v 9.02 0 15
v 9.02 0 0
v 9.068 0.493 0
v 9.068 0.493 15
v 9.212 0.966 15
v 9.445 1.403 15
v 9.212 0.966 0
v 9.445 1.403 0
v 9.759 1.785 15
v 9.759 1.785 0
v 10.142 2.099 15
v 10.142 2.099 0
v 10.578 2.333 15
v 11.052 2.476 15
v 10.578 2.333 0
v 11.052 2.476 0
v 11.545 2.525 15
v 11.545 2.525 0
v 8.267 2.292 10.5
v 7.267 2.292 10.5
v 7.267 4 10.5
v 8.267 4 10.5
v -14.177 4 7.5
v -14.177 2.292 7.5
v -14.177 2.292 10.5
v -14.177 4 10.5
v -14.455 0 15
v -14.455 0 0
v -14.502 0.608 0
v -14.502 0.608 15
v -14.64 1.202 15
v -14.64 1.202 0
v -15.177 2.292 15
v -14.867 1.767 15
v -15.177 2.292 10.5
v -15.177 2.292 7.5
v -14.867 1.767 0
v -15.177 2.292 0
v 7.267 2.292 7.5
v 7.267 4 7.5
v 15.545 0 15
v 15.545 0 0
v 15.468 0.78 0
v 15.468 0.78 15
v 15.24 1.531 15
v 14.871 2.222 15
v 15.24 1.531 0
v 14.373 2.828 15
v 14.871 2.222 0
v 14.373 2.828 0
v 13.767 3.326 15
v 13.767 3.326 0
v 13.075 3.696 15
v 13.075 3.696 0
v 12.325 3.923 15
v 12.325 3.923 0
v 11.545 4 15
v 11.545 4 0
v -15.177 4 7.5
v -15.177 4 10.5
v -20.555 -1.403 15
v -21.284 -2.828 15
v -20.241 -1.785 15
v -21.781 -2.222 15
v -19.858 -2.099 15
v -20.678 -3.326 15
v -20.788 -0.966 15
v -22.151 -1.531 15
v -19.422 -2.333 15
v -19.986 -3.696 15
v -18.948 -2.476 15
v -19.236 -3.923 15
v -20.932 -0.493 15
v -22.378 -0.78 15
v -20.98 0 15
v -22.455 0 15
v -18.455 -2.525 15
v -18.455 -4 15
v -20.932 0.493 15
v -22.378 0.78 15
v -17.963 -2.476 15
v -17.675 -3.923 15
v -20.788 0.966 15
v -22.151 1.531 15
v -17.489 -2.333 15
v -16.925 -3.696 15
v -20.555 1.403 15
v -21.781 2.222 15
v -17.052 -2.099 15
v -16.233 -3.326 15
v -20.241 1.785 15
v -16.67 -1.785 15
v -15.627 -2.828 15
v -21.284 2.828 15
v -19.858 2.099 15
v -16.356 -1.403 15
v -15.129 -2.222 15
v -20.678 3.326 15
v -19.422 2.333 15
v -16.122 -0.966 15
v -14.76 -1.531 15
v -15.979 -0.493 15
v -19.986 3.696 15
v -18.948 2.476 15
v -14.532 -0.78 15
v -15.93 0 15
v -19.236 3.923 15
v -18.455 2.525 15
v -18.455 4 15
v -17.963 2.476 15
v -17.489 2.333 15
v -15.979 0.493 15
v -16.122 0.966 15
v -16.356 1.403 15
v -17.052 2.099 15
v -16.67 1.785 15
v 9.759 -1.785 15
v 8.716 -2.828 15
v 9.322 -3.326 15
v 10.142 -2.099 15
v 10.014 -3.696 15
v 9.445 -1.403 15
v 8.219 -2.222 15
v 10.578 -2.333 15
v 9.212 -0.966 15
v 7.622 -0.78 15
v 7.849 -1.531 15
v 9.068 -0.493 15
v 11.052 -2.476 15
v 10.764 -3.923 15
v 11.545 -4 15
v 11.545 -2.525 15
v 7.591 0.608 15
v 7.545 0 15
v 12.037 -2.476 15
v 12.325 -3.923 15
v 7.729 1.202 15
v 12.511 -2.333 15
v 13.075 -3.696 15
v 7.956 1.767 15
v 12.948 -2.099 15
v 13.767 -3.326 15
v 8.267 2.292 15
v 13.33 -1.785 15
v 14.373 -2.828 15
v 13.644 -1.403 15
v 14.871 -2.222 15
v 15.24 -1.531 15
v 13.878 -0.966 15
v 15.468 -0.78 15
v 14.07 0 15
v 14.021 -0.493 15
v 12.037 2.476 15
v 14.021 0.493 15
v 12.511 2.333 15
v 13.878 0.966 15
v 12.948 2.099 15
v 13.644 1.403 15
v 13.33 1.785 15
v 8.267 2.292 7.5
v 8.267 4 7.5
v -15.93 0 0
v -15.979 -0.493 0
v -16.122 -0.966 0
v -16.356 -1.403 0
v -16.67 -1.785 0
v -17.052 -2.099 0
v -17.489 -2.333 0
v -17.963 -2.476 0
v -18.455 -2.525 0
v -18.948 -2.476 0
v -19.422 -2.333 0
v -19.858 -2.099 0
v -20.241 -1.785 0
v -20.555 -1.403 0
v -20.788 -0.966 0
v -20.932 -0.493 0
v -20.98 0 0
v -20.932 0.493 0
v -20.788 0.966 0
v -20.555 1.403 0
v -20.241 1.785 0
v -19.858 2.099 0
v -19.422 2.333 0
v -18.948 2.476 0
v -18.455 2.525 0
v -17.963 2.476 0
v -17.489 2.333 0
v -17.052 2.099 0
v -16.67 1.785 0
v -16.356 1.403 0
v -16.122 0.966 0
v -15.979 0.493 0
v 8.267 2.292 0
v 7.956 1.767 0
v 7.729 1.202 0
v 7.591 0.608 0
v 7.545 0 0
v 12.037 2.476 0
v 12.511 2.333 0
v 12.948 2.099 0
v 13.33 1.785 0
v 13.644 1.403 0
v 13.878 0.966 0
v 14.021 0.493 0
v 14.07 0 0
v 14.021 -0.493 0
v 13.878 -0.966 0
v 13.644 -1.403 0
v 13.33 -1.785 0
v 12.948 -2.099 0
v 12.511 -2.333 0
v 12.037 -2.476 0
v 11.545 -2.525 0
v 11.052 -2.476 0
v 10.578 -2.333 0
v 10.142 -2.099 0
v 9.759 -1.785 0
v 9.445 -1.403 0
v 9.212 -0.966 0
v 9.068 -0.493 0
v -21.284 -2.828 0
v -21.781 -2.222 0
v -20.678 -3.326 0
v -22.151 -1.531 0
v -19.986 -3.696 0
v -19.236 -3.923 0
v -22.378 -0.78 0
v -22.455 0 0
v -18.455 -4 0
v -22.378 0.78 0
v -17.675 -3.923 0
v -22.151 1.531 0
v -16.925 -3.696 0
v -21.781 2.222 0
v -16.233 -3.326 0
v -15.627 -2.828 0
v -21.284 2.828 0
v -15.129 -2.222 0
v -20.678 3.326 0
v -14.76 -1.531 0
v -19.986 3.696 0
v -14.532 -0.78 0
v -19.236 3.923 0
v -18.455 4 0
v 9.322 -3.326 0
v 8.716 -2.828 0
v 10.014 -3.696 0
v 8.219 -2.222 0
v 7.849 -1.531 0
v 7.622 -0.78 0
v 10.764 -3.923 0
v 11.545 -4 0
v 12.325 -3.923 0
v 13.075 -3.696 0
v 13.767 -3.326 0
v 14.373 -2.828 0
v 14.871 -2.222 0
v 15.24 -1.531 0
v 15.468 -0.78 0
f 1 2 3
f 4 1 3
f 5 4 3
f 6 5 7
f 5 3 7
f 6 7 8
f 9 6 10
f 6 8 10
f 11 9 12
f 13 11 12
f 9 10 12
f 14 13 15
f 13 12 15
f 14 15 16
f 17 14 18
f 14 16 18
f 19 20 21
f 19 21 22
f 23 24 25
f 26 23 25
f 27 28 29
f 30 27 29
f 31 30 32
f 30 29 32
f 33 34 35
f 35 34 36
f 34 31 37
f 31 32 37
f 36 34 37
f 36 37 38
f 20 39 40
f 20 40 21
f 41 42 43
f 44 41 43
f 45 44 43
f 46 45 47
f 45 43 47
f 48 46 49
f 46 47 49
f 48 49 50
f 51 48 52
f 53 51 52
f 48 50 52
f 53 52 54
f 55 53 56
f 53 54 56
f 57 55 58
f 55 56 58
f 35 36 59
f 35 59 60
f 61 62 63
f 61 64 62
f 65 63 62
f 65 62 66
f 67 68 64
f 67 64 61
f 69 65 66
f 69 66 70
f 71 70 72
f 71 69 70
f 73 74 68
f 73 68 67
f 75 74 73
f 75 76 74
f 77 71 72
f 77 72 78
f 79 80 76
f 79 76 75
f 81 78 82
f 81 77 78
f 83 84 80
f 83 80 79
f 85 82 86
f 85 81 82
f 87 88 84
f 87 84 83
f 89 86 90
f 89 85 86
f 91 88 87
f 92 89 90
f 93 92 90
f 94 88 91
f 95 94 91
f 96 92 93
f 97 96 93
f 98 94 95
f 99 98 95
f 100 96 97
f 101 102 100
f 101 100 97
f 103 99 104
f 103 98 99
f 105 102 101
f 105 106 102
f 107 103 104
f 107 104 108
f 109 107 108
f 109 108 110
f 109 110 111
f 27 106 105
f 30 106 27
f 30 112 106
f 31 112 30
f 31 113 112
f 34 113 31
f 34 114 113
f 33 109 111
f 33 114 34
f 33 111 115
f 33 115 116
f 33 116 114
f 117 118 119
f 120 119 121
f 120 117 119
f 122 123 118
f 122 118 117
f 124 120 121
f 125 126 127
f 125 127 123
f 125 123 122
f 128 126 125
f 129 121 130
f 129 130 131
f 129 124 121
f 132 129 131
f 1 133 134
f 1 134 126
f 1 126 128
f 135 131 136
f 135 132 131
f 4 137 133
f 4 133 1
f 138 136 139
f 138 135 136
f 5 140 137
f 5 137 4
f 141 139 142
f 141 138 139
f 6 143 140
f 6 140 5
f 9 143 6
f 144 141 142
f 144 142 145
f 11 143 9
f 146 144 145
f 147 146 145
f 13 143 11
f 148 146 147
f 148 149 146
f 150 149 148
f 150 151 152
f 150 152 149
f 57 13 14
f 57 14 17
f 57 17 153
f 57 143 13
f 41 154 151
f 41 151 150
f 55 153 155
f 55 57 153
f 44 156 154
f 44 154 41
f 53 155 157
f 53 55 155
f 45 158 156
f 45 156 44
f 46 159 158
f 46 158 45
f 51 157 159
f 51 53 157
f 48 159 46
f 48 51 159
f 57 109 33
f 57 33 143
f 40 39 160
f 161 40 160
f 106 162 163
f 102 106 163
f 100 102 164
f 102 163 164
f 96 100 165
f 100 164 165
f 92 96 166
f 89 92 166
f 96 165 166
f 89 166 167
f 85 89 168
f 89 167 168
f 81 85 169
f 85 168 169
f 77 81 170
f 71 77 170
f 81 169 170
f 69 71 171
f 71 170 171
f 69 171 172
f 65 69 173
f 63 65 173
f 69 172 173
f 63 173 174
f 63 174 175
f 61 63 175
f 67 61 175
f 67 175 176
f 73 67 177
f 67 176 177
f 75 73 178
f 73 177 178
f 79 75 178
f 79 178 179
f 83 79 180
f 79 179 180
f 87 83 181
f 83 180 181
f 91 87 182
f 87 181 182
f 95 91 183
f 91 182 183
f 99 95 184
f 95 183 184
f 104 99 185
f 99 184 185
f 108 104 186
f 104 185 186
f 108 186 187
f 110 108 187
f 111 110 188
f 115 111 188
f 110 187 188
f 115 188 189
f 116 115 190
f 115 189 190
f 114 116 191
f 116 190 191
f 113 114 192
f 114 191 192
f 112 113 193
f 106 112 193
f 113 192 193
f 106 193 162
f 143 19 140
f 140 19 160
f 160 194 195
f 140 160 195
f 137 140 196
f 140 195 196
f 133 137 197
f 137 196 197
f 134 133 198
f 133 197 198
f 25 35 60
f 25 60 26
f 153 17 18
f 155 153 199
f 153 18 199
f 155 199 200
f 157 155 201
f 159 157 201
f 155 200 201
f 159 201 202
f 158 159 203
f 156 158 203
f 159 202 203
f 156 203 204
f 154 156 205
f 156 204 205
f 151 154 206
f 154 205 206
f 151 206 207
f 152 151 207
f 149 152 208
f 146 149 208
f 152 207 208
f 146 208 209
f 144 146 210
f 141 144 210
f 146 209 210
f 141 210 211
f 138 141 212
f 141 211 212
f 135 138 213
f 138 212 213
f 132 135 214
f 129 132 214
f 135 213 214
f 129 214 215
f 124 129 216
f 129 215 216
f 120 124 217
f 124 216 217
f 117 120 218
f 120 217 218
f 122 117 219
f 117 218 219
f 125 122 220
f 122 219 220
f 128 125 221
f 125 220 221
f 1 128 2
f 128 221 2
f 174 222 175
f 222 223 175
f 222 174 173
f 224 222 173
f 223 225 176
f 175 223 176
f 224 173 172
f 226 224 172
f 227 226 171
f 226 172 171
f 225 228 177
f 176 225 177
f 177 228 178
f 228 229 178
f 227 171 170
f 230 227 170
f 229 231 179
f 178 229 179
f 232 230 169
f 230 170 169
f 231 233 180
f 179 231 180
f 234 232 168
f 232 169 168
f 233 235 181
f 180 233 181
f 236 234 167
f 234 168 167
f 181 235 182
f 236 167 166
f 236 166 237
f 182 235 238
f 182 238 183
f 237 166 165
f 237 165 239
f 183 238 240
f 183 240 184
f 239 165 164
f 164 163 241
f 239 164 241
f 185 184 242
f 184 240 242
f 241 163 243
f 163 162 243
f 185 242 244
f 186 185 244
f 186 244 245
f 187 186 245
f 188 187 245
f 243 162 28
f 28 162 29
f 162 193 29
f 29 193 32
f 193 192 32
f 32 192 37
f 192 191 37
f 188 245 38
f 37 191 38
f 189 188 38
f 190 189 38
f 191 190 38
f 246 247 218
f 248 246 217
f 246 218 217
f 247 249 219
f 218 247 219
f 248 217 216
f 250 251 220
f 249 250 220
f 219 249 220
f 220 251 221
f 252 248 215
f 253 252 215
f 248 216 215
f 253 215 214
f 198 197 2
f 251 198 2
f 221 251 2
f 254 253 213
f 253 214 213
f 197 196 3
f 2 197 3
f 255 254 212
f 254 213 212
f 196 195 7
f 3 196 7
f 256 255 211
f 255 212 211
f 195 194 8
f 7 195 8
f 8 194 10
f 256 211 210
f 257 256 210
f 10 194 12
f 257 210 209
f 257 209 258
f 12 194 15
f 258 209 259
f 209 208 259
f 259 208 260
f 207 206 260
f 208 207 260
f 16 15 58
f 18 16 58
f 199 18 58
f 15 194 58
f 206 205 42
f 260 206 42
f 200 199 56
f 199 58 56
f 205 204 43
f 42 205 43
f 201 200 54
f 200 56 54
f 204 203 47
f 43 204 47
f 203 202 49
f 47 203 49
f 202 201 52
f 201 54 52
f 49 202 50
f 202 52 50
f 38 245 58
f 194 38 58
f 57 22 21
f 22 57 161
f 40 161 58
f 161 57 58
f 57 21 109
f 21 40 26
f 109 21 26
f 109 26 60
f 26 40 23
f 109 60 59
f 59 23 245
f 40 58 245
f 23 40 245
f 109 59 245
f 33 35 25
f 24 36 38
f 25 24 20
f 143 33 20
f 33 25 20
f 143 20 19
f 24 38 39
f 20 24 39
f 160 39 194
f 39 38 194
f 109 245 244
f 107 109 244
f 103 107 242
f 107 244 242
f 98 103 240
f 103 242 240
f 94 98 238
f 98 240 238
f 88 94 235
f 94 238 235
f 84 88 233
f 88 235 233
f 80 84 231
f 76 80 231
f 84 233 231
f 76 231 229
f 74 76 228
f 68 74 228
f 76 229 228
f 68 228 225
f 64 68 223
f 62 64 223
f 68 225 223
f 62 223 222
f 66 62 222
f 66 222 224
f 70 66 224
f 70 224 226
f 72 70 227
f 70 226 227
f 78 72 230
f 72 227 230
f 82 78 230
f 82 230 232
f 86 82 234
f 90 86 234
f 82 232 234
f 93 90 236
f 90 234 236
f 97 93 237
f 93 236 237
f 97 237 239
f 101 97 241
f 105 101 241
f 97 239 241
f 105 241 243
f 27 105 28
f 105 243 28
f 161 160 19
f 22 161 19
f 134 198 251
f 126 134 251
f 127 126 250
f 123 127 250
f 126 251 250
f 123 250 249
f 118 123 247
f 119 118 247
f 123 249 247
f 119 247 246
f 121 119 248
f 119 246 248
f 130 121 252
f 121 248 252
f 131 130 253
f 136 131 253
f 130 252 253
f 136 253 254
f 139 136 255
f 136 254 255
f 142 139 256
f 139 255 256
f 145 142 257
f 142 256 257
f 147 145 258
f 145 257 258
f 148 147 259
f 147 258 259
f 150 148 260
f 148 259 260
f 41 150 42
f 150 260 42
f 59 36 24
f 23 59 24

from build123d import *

# Parameters (mm, degrees)
F1_DEPTH = 15
F2_W     = 1
F2_H     = 3
F3_DEPTH = 25


with BuildPart() as f1:
    # F0 (on Top) → F1 (new body)
    with BuildSketch(Plane.XY):
        with BuildLine():
            ThreePointArc((-18.455241, 2.525), (-16.669796, 1.785445), (-15.930241, 0))
            Line((-15.930241, 0), (-14.455241, 0))
            ThreePointArc((-14.455241, 0), (-14.639965, 1.201527), (-15.177075, 2.292079))
            ThreePointArc((-15.177075, 2.292079), (-16.607041, 3.547416), (-18.455241, 4))
            Line((-18.455241, 4), (-18.455241, 2.525))
        make_face()
        with BuildLine():
            Line((11.544759, 2.525), (11.544759, 4))
            ThreePointArc((11.544759, 4), (9.69656, 3.547416), (8.266593, 2.292079))
            ThreePointArc((8.266593, 2.292079), (7.729483, 1.201527), (7.544759, 0))
            Line((7.544759, 0), (9.019759, 0))
            ThreePointArc((9.019759, 0), (9.759315, 1.785445), (11.544759, 2.525))
        make_face()
        with BuildLine():
            Line((-14.455241, 0), (-15.930241, 0))
            ThreePointArc((-15.930241, 0), (-20.240685, -1.785445), (-18.455241, 2.525))
            Line((-18.455241, 2.525), (-18.455241, 4))
            ThreePointArc((-18.455241, 4), (-21.283668, -2.828427), (-14.455241, 0))
        make_face()
        with BuildLine():
            ThreePointArc((15.544759, 0), (14.373186, 2.828427), (11.544759, 4))
            Line((11.544759, 4), (11.544759, 2.525))
            ThreePointArc((11.544759, 2.525), (13.330204, 1.785445), (14.069759, 0))
            ThreePointArc((14.069759, 0), (11.544759, -2.525), (9.019759, 0))
            Line((9.019759, 0), (7.544759, 0))
            ThreePointArc((7.544759, 0), (11.544759, -4), (15.544759, 0))
        make_face()
        with BuildLine():
            Line((11.544759, 4), (-18.455241, 4))
            ThreePointArc((-18.455241, 4), (-16.607041, 3.547416), (-15.177075, 2.292079))
            Line((-15.177075, 2.292079), (-12.304623, 2.292079))
            Line((-12.304623, 2.292079), (6.274519, 2.292079))
            Line((6.274519, 2.292079), (8.266593, 2.292079))
            ThreePointArc((8.266593, 2.292079), (9.69656, 3.547416), (11.544759, 4))
        make_face()
    extrude(amount=F1_DEPTH)

    # F2 (on face) → F3 (cut)
    with BuildSketch(Plane.XZ.offset(-2.292079)):
        with Locations((-14.677075, 9)):
            Rectangle(F2_W, F2_H)
        with Locations((7.766593, 9)):
            Rectangle(F2_W, F2_H)
    extrude(amount=-F3_DEPTH, mode=Mode.SUBTRACT)


solid = f1.part
